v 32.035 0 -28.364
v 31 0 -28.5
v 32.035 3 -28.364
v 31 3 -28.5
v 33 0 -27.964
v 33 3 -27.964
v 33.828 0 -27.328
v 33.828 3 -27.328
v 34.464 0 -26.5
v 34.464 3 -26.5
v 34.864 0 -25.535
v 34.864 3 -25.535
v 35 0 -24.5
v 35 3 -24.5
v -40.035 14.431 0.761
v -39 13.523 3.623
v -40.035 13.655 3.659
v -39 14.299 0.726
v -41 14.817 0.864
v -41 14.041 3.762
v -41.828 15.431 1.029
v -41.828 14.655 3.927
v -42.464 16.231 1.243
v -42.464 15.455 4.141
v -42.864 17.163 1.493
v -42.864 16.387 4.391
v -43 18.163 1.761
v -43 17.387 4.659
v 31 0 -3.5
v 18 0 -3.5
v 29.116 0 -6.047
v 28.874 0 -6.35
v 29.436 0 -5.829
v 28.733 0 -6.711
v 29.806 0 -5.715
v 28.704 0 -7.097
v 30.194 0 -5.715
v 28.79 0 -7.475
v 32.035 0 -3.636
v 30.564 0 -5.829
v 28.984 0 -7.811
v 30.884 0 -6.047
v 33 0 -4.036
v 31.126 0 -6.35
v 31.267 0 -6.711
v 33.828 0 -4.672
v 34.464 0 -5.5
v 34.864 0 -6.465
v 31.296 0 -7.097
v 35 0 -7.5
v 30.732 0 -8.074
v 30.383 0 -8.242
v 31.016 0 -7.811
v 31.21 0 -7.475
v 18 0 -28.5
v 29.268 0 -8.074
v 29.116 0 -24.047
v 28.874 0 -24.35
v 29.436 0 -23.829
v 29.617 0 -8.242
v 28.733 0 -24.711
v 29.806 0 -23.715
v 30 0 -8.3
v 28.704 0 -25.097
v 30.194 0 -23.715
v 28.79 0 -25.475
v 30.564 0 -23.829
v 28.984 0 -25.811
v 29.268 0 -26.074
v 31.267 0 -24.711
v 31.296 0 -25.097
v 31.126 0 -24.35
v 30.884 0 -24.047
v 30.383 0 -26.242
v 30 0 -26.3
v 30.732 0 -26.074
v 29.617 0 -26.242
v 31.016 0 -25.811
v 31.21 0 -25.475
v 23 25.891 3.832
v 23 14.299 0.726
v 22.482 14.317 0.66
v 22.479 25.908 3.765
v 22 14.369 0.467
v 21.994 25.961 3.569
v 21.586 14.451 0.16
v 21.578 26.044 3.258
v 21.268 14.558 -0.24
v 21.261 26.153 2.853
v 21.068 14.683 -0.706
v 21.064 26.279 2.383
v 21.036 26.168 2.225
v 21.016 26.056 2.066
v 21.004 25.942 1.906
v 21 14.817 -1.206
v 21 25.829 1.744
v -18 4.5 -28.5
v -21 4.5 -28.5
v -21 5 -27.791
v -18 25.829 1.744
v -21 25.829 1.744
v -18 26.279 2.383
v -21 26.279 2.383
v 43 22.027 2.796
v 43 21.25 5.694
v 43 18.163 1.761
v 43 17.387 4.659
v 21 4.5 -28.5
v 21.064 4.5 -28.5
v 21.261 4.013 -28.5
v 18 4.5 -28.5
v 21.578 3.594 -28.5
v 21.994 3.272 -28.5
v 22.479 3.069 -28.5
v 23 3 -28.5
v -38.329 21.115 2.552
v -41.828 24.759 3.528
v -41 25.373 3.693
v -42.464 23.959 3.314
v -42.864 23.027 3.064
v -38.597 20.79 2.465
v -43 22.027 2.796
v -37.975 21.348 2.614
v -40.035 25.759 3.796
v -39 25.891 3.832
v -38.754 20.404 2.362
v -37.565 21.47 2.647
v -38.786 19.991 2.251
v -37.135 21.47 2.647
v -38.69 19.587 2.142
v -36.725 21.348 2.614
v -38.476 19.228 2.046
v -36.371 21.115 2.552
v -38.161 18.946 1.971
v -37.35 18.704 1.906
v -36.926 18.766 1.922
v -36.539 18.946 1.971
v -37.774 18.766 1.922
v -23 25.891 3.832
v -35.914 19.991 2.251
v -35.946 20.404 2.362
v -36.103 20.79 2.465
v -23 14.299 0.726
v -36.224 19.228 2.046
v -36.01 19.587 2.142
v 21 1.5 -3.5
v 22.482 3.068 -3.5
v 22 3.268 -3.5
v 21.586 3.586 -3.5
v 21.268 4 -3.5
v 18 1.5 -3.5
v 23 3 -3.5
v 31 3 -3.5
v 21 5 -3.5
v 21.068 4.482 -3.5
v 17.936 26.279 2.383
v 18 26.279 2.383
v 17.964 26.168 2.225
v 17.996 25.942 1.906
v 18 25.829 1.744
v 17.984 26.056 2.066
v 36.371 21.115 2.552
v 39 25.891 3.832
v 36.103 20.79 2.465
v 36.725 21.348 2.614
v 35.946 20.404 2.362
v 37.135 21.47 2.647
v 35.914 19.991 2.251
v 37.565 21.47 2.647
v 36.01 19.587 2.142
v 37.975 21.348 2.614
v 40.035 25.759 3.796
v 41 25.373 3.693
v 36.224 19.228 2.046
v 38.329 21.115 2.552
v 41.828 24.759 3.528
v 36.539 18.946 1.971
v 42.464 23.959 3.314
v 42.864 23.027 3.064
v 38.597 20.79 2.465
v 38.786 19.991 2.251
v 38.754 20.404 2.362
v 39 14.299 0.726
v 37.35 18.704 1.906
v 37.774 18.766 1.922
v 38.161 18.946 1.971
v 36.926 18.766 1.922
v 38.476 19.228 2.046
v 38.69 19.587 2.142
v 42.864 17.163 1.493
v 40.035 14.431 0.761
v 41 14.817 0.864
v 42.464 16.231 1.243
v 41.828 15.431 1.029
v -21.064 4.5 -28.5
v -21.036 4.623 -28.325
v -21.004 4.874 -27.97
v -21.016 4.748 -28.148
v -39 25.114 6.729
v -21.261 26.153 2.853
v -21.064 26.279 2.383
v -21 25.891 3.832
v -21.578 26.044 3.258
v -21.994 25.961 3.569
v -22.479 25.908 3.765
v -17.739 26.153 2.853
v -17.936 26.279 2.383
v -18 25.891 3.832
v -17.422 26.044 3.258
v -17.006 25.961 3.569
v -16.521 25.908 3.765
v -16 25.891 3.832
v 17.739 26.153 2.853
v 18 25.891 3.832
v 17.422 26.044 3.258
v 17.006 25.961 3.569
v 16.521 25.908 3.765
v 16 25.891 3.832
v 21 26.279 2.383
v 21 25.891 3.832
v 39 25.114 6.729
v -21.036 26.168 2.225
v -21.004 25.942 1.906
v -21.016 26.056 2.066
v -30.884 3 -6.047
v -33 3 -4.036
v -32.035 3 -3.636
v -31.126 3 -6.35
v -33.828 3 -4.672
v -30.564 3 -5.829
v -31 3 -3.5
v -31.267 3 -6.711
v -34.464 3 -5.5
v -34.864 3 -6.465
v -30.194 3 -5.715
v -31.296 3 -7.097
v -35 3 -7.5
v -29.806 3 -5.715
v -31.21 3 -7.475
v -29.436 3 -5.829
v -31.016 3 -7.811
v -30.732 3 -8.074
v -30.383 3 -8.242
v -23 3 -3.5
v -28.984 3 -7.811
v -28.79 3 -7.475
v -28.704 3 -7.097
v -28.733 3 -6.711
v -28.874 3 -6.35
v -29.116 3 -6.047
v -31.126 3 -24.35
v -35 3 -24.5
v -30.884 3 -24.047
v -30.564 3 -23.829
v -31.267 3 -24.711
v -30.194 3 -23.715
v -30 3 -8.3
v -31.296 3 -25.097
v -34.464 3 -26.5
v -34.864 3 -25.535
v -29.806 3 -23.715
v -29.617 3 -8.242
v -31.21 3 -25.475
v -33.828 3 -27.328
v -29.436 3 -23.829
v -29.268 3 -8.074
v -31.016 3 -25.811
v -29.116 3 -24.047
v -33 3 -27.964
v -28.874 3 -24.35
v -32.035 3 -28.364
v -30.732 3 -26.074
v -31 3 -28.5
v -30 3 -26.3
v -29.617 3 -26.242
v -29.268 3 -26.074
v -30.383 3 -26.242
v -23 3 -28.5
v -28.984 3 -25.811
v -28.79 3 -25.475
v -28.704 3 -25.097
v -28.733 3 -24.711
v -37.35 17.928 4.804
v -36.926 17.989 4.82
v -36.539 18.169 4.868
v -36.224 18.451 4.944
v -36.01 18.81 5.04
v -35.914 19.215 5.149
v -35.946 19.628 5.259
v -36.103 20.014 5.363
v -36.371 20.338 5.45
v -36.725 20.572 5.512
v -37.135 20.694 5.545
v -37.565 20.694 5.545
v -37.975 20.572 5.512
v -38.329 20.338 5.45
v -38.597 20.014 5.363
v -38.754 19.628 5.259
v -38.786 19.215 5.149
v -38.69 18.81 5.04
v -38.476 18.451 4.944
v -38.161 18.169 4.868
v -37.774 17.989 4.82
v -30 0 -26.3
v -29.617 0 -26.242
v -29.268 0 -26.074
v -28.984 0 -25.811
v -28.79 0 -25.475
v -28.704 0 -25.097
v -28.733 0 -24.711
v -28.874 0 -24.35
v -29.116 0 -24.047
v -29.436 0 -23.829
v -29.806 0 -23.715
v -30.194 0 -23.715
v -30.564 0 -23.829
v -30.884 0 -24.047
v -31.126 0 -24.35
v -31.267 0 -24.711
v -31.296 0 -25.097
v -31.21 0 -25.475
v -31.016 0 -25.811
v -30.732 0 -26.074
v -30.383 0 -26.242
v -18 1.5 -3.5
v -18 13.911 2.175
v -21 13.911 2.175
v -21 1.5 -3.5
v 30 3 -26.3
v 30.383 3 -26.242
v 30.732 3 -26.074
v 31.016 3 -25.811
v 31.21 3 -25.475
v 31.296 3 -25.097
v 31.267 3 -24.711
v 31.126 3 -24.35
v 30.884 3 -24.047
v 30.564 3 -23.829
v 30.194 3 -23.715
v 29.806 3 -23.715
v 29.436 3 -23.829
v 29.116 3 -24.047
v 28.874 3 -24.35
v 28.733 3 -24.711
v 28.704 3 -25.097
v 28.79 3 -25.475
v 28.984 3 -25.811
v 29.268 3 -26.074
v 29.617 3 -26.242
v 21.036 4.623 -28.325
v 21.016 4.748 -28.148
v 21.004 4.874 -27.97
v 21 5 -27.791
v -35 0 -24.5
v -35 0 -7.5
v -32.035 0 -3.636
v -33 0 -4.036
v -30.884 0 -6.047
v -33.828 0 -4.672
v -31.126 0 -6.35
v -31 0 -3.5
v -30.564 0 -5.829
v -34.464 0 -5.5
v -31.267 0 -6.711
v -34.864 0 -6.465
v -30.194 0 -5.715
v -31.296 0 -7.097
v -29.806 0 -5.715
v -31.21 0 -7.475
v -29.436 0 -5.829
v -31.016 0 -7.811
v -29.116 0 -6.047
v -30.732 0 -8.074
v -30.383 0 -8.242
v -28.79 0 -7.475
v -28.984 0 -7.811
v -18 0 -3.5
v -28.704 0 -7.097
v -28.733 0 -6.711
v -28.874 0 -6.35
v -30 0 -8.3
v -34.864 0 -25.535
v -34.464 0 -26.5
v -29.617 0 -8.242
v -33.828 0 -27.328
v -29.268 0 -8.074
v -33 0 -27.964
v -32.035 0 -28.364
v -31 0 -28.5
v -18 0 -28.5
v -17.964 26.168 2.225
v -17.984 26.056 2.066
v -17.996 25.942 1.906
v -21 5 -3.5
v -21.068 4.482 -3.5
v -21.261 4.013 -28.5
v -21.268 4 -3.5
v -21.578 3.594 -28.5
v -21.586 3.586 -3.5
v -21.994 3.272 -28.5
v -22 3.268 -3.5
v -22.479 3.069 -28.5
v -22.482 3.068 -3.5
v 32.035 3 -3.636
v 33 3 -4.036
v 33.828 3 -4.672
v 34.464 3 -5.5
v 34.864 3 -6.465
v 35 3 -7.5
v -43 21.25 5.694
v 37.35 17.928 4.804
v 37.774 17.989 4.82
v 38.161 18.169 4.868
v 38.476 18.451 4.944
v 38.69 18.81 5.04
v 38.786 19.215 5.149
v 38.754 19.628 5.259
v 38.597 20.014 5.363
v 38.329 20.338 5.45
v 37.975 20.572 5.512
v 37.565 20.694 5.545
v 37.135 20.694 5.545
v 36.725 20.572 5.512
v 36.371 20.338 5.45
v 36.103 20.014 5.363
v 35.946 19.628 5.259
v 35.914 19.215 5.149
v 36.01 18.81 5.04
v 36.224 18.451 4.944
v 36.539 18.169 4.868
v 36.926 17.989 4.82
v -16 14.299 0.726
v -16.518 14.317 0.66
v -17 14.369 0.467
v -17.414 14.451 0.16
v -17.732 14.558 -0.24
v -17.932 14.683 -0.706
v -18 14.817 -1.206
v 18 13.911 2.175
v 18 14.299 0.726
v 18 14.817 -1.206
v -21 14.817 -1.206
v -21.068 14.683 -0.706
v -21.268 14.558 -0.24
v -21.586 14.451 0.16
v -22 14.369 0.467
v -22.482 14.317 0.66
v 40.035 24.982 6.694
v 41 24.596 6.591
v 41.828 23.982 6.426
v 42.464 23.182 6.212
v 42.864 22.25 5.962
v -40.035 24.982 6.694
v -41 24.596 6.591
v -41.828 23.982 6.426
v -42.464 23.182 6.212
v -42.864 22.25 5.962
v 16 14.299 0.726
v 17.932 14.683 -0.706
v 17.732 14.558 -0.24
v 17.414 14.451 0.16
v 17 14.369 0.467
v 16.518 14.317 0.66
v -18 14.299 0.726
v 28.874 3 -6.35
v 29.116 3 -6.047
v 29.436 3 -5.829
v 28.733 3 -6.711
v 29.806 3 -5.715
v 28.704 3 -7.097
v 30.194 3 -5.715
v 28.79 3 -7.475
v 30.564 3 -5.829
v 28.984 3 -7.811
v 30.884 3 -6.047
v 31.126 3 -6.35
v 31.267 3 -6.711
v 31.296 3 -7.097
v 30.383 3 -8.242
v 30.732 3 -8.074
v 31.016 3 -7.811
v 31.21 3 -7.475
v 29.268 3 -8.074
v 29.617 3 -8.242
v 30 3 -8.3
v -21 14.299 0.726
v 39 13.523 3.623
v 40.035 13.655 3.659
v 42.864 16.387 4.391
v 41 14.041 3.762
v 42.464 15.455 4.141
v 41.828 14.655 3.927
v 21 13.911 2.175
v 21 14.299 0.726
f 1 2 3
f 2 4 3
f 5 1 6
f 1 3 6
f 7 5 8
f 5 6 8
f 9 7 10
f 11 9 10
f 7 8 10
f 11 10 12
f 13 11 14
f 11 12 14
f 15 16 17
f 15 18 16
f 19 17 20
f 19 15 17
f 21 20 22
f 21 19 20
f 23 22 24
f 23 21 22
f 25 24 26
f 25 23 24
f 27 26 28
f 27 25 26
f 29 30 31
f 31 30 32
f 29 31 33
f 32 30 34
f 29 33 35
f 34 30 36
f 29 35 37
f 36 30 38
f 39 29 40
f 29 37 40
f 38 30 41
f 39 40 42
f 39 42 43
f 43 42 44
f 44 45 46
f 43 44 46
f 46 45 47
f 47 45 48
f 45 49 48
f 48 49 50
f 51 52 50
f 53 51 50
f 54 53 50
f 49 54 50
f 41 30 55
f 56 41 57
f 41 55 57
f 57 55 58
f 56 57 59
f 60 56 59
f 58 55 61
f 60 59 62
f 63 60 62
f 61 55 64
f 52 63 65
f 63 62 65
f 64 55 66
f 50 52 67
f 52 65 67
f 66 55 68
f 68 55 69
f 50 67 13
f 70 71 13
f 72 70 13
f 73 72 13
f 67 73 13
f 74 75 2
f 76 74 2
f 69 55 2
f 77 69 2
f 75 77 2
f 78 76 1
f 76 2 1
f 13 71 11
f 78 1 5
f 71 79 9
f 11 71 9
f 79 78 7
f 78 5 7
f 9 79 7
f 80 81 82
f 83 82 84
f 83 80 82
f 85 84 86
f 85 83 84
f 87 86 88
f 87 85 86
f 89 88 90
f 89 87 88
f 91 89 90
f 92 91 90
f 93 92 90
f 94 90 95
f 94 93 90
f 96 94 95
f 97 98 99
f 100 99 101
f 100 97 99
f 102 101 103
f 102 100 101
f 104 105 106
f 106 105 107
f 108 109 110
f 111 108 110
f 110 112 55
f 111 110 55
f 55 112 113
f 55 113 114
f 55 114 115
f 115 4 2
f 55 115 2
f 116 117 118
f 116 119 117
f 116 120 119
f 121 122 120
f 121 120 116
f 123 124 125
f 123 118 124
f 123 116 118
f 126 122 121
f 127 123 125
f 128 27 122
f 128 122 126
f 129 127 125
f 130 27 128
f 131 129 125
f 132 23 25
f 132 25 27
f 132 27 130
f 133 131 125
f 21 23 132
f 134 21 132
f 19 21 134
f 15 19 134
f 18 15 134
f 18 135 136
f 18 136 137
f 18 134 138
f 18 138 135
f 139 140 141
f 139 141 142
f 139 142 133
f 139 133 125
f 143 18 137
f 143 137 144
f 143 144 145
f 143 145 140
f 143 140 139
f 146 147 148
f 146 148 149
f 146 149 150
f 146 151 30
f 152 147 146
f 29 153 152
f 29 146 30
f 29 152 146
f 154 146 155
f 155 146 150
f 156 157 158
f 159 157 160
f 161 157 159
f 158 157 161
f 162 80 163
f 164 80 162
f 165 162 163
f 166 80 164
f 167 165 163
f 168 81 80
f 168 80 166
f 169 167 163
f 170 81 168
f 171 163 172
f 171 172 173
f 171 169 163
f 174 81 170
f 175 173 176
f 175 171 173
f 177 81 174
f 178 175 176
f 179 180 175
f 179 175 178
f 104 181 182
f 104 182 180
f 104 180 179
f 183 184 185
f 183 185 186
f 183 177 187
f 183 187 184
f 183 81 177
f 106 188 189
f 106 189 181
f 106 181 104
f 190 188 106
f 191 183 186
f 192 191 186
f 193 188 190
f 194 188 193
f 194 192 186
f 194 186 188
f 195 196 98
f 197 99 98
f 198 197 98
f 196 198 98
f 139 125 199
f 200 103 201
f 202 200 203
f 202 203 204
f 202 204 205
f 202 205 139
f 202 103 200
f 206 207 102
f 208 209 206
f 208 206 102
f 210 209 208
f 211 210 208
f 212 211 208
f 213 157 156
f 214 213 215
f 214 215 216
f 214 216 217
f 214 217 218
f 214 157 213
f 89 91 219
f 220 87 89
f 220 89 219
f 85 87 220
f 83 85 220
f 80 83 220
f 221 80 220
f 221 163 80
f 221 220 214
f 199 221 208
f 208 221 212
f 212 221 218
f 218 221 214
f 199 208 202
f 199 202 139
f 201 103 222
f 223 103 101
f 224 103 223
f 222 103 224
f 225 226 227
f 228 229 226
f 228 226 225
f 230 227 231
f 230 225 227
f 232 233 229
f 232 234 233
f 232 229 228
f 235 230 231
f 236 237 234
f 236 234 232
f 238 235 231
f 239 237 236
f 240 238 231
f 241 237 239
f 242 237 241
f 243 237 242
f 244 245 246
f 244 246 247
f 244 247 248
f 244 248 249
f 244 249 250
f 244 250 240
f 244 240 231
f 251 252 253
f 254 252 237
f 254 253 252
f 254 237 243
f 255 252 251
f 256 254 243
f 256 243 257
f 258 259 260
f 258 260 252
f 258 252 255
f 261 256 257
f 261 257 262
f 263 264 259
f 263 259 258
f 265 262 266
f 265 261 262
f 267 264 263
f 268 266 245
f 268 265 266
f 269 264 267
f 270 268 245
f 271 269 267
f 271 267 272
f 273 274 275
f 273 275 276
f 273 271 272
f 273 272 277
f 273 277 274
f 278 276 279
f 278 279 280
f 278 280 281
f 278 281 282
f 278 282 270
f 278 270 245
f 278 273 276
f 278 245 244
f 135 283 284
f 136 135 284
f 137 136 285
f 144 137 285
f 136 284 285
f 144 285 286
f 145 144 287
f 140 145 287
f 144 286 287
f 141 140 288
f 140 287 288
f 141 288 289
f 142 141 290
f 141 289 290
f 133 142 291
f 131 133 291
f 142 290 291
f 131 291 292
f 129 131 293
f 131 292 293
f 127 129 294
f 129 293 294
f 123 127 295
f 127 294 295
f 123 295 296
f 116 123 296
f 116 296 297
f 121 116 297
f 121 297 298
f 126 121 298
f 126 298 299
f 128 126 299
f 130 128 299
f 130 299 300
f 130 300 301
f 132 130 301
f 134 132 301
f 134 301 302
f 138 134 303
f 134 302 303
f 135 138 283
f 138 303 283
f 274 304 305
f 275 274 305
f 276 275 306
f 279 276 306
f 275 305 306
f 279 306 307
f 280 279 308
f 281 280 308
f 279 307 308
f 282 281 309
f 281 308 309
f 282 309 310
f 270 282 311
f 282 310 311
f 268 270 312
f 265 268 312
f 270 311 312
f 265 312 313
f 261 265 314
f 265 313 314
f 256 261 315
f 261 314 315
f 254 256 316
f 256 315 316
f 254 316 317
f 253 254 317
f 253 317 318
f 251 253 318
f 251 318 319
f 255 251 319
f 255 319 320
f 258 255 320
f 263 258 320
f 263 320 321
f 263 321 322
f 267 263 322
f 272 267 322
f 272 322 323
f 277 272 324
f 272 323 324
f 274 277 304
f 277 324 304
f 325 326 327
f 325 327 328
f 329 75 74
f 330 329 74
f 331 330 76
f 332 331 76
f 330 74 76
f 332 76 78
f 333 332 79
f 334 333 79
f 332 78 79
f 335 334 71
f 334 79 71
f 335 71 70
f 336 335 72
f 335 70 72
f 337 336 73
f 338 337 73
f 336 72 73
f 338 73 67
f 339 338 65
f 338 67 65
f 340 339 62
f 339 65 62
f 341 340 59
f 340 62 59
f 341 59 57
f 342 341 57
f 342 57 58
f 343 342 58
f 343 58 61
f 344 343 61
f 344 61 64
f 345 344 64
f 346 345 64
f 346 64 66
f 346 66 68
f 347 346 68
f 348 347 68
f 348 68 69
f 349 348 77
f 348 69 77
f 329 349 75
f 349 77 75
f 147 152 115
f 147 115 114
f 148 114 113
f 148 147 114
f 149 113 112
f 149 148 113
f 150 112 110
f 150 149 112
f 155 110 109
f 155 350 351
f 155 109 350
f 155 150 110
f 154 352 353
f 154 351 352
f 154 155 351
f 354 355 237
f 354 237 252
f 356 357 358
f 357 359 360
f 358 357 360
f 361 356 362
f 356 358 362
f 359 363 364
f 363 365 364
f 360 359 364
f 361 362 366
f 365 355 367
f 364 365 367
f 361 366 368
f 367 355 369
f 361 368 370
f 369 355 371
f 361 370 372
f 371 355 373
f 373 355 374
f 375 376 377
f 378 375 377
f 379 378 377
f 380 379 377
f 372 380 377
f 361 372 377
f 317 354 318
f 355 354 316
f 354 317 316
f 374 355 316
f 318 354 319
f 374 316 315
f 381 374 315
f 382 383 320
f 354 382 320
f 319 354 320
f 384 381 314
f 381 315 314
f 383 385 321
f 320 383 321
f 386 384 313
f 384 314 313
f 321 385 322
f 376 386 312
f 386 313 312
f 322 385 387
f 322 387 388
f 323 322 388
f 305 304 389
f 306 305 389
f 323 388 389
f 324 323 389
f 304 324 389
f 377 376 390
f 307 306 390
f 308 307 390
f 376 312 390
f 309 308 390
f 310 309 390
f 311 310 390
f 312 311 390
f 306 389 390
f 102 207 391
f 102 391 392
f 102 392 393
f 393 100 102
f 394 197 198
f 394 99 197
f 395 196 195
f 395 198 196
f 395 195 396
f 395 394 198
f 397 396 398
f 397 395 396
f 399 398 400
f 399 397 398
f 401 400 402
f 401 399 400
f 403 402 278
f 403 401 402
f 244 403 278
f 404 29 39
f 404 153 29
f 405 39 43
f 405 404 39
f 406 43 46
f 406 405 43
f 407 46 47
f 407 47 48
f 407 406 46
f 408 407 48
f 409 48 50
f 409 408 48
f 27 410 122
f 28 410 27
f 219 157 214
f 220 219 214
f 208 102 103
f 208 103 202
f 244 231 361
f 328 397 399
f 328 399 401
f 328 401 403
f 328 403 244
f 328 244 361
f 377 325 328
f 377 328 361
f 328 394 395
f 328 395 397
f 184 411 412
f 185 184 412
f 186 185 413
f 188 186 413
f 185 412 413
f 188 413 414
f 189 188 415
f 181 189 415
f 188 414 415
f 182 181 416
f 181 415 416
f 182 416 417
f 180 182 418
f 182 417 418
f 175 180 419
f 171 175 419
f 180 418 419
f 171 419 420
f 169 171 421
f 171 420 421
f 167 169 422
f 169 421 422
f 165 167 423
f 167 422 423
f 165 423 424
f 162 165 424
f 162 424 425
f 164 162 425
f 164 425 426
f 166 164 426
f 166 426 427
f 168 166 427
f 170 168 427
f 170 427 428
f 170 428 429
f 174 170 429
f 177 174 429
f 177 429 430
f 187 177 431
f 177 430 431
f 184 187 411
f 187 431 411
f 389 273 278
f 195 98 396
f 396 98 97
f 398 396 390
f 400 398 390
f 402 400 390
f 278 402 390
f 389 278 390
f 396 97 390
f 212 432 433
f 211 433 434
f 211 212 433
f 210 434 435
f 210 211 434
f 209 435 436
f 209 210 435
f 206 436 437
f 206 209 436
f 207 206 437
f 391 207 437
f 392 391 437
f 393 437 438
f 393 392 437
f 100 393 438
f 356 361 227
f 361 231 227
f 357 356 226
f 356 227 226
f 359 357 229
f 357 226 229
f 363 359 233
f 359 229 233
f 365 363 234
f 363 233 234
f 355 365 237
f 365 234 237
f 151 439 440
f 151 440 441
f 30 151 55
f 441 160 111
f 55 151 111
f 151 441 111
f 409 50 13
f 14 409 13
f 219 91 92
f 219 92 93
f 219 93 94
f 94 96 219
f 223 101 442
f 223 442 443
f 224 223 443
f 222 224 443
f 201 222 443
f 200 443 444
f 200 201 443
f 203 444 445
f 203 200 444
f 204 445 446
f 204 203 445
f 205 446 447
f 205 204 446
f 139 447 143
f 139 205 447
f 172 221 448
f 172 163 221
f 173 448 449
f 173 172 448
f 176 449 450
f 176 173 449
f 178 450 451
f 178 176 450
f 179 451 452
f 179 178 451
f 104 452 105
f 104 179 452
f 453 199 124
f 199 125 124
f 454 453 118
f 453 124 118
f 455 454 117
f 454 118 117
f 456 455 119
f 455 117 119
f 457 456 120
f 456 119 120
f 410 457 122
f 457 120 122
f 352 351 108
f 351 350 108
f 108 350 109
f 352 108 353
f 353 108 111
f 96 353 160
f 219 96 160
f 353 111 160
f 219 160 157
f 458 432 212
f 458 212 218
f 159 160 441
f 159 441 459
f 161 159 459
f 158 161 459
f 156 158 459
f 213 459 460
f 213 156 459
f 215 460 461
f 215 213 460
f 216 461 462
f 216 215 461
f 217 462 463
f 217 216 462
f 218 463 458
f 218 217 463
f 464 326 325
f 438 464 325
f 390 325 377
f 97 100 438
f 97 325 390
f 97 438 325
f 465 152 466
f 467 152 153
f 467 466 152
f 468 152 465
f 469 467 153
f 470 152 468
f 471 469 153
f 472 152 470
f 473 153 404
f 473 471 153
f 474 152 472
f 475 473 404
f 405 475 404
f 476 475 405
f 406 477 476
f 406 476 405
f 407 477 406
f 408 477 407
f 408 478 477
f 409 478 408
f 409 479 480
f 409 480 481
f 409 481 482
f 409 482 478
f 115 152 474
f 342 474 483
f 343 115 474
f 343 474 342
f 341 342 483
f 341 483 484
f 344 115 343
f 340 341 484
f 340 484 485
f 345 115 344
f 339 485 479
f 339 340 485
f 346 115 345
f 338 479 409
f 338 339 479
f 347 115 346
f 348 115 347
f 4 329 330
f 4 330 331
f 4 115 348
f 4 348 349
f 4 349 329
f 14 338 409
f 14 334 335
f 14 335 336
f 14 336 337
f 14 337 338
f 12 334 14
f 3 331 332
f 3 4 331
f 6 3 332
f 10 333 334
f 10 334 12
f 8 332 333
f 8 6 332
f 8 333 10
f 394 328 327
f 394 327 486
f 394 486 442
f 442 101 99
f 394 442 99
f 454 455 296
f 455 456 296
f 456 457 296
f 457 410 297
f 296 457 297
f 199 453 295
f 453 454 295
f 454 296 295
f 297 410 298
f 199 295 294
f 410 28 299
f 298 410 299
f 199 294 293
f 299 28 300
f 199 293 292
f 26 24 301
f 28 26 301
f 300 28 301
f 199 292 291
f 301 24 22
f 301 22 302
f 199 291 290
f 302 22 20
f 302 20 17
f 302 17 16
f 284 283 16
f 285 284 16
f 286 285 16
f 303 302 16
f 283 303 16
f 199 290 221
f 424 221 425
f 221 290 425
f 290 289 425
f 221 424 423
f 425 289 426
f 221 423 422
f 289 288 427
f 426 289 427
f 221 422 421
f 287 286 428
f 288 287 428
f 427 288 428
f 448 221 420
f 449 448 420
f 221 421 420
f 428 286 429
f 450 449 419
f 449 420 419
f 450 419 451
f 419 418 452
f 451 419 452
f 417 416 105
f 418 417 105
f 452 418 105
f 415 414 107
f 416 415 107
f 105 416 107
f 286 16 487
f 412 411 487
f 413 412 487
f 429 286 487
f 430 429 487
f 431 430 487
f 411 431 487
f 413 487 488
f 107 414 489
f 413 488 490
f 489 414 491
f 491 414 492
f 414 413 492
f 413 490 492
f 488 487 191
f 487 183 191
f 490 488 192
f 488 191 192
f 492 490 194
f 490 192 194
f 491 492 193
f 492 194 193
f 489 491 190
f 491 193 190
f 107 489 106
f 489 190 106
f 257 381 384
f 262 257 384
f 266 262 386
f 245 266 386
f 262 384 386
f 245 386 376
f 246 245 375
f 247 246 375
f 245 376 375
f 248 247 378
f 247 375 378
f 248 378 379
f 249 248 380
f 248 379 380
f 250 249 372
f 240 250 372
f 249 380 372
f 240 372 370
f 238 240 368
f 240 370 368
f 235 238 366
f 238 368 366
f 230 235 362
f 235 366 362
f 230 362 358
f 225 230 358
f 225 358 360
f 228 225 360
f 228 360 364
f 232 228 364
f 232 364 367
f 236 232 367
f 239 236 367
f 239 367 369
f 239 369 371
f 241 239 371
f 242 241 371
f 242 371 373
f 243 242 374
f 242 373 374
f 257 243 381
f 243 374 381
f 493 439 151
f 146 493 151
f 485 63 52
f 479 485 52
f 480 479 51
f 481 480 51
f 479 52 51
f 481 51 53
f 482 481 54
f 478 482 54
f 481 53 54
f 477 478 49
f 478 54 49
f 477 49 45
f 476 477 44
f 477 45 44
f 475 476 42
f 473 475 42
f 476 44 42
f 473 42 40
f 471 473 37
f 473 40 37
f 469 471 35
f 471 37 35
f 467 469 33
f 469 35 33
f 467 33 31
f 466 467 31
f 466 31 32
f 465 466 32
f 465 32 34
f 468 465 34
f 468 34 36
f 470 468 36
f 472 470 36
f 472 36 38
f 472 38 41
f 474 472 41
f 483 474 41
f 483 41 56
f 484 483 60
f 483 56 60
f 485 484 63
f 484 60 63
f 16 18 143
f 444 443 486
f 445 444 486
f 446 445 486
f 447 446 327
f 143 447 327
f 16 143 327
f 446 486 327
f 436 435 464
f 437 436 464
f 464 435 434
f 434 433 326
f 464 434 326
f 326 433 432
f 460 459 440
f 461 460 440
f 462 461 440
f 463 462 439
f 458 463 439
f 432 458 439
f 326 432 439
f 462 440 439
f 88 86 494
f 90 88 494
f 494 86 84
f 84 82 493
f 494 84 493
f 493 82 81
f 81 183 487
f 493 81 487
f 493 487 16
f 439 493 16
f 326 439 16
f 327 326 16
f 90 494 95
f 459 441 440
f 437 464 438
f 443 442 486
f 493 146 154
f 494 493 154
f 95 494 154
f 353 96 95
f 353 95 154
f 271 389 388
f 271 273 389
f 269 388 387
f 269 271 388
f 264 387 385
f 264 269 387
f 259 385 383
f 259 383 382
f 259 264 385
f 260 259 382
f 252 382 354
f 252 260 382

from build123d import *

# Parameters (mm, degrees)
SKETCH1_W             = 17
SKETCH1_H             = 25
BOSS_EXTRUDE1_DEPTH   = 3
BOSS_EXTRUDE1_2_DEPTH = 3
SKETCH2_W             = 86
SKETCH2_H             = 12
BOSS_EXTRUDE2_DEPTH   = 3
SKETCH3_R             = 1.3
CUT_EXTRUDE1_DEPTH    = 3
SKETCH4_R             = 1.44
CUT_EXTRUDE2_DEPTH    = 3
BOSS_EXTRUDE3_START   = 18
BOSS_EXTRUDE3_DEPTH   = 3
BOSS_EXTRUDE4_START   = -18
BOSS_EXTRUDE4_DEPTH   = 3
FILLET1_R             = 2
FILLET2_R             = 4


with BuildPart() as part:
    # Sketch1 → Boss-Extrude1 (new body)
    with BuildSketch(Plane(origin=(0, 0, 0), x_dir=(1, 0, 0), z_dir=(0, 1, 0))):
        with Locations((-26.5, 16)):
            Rectangle(SKETCH1_W, SKETCH1_H)
    extrude(amount=BOSS_EXTRUDE1_DEPTH)


with BuildPart() as body_2:
    # Sketch1 → Boss-Extrude1 2 (new body)
    with BuildSketch(Plane(origin=(0, 0, 0), x_dir=(1, 0, 0), z_dir=(0, 1, 0))):
        with Locations((26.5, 16)):
            Rectangle(SKETCH1_W, SKETCH1_H)
    extrude(amount=BOSS_EXTRUDE1_2_DEPTH)


with BuildPart() as body_3:
    # Sketch2 → Boss-Extrude2 (new body)
    with BuildSketch(Plane(origin=(0, 0, 0), x_dir=(1, 0, 0), z_dir=(0, 0.2588190451025247, -0.9659258262890672))):
        with Locations((0, -20)):
            Rectangle(SKETCH2_W, SKETCH2_H)
    extrude(amount=BOSS_EXTRUDE2_DEPTH)

    # Sketch4 → Cut-Extrude2 (cut)
    with BuildSketch(Plane(origin=(0, 0, 0), x_dir=(1, 0, 0), z_dir=(0, -0.25881904510252474, 0.9659258262890673))):
        with Locations(Location((-37.35, 20, 0), (0, 0, 270))):
            Circle(SKETCH4_R)
        with Locations(Location((37.35, 20, 0), (0, 0, 270))):
            Circle(SKETCH4_R)
    extrude(amount=-CUT_EXTRUDE2_DEPTH, mode=Mode.SUBTRACT)


with BuildPart() as cut_extrude1_tool:
    # Sketch3 → Cut-Extrude1 (new body)
    with BuildSketch(Plane.XZ):
        with Locations(Location((30, -25, 0), (0, 0, 270))):
            Circle(SKETCH3_R)
        with Locations(Location((30, -7, 0), (0, 0, 270))):
            Circle(SKETCH3_R)
        with Locations(Location((-30, -25, 0), (0, 0, 270))):
            Circle(SKETCH3_R)
        with Locations(Location((-30, -7, 0), (0, 0, 270))):
            Circle(SKETCH3_R)
    extrude(amount=-CUT_EXTRUDE1_DEPTH)


with BuildPart() as part_1:
    add(part.part)

    # Cut-Extrude1: cut by cut_extrude1_tool
    add(cut_extrude1_tool.part, mode=Mode.SUBTRACT)



with BuildPart() as body_2_1:
    add(body_2.part)

    # Cut-Extrude1: cut by cut_extrude1_tool
    add(cut_extrude1_tool.part, mode=Mode.SUBTRACT)


    add(body_3.part)  # Boss-Extrude3 merges body 3
    # Sketch5 → Boss-Extrude3 (add)
    with BuildSketch(Plane(origin=(0, 0, 0), x_dir=(0, 0, -1), z_dir=(1, 0, 0)).offset(BOSS_EXTRUDE3_START)):
        Polygon((3.5, 3), (28.5, 3), (28.5, 4.5), (-2.382628954, 26.278757186), (-3.831517694, 25.890528619), (-0.725689153, 14.299418703), (-2.174577892, 13.911190136), (3.5, 1.5), align=None)
    extrude(amount=BOSS_EXTRUDE3_DEPTH)


with BuildPart() as part_2:
    add(part_1.part)

    add(body_2_1.part)  # Boss-Extrude4 merges body 2
    # Sketch5<2> → Boss-Extrude4 (add)
    with BuildSketch(Plane(origin=(0, 0, 0), x_dir=(0, 0, -1), z_dir=(1, 0, 0)).offset(BOSS_EXTRUDE4_START)):
        Polygon((3.5, 3), (28.5, 3), (28.5, 4.5), (-2.382628954, 26.278757186), (-3.831517694, 25.890528619), (-0.725689153, 14.299418703), (-2.174577892, 13.911190136), (3.5, 1.5), align=None)
    extrude(amount=-BOSS_EXTRUDE4_DEPTH)

    # Fillet1
    # the kernel refuses this fillet: 2 mm, written as the material it adds along each edge
    with BuildSketch(Plane(origin=(-21, 3, -3.5), x_dir=(0, 1, 0), z_dir=(0, 0, -1))) as fillet1_piece_1_section:
        with BuildLine():
            CenterArc((FILLET1_R, -FILLET1_R), FILLET1_R, 90, 90)
            Line((0, -FILLET1_R), (0, 0))
            Line((0, 0), (FILLET1_R, 0))
        make_face()
    fillet1_piece_1 = extrude(amount=25, mode=Mode.PRIVATE)
    fillet1_piece_1 = split(fillet1_piece_1, bisect_by=Plane(origin=(-21.452953813, 10.041317551, -20.642322338), z_dir=(0, -0.8172264215847361, 0.5763167322434836)), keep=Keep.TOP, mode=Mode.PRIVATE)
    add(fillet1_piece_1)
    with BuildSketch(Plane(origin=(21, 3, -3.5), x_dir=(0, 1, 0), z_dir=(0, 0, -1))) as fillet1_piece_2_section:
        with BuildLine():
            CenterArc((FILLET1_R, FILLET1_R), FILLET1_R, 180, 90)
            Line((0, FILLET1_R), (0, 0))
            Line((0, 0), (FILLET1_R, 0))
        make_face()
    fillet1_piece_2 = extrude(amount=25, mode=Mode.PRIVATE)
    fillet1_piece_2 = split(fillet1_piece_2, bisect_by=Plane(origin=(21.452953813, 10.041317551, -20.642322338), z_dir=(0, -0.8172264215847361, 0.5763167322434836)), keep=Keep.TOP, mode=Mode.PRIVATE)
    add(fillet1_piece_2)
    with BuildSketch(Plane(origin=(-18, 25.890528619, 3.831517694), x_dir=(1, 0, 0), z_dir=(0, -0.9659258262890673, -0.2588190451025247))) as fillet1_piece_3_section:
        with BuildLine():
            CenterArc((FILLET1_R, -FILLET1_R), FILLET1_R, 90, 90)
            Line((0, -FILLET1_R), (0, 0))
            Line((0, 0), (FILLET1_R, 0))
        make_face()
    fillet1_piece_3 = extrude(amount=12, mode=Mode.PRIVATE)
    fillet1_piece_3 = split(fillet1_piece_3, bisect_by=Plane(origin=(-17.546921316, 24.007524822, -0.83801517), z_dir=(0, -0.8172264215847361, 0.5763167322434836)), keep=Keep.TOP, mode=Mode.PRIVATE)
    add(fillet1_piece_3)
    with BuildSketch(Plane(origin=(-21, 25.890528619, 3.831517694), x_dir=(0, 0.2588190451025247, -0.9659258262890672), z_dir=(0, -0.9659258262890673, -0.2588190451025247))) as fillet1_piece_4_section:
        with BuildLine():
            CenterArc((FILLET1_R, -FILLET1_R), FILLET1_R, 90, 90)
            Line((0, -FILLET1_R), (0, 0))
            Line((0, 0), (FILLET1_R, 0))
        make_face()
    fillet1_piece_4 = extrude(amount=12, mode=Mode.PRIVATE)
    fillet1_piece_4 = split(fillet1_piece_4, bisect_by=Plane(origin=(-21.453078684, 24.007524822, -0.838015171), z_dir=(0, -0.8172264215847361, 0.5763167322434836)), keep=Keep.TOP, mode=Mode.PRIVATE)
    add(fillet1_piece_4)
    with BuildSketch(Plane(origin=(21, 25.890528619, 3.831517694), x_dir=(1, 0, 0), z_dir=(0, -0.9659258262890673, -0.2588190451025247))) as fillet1_piece_5_section:
        with BuildLine():
            CenterArc((FILLET1_R, -FILLET1_R), FILLET1_R, 90, 90)
            Line((0, -FILLET1_R), (0, 0))
            Line((0, 0), (FILLET1_R, 0))
        make_face()
    fillet1_piece_5 = extrude(amount=12, mode=Mode.PRIVATE)
    fillet1_piece_5 = split(fillet1_piece_5, bisect_by=Plane(origin=(21.453078684, 24.007524822, -0.83801517), z_dir=(0, -0.8172264215847361, 0.5763167322434836)), keep=Keep.TOP, mode=Mode.PRIVATE)
    add(fillet1_piece_5)
    with BuildSketch(Plane(origin=(18, 25.890528619, 3.831517694), x_dir=(-1.776356839400251e-15, 0.25881904510252474, -0.9659258262890673), z_dir=(0, -0.9659258262890673, -0.2588190451025247))) as fillet1_piece_6_section:
        with BuildLine():
            CenterArc((FILLET1_R, -FILLET1_R), FILLET1_R, 90, 90)
            Line((0, -FILLET1_R), (0, 0))
            Line((0, 0), (FILLET1_R, 0))
        make_face()
    fillet1_piece_6 = extrude(amount=12, mode=Mode.PRIVATE)
    fillet1_piece_6 = split(fillet1_piece_6, bisect_by=Plane(origin=(17.546921316, 24.007524822, -0.838015171), z_dir=(0, -0.8172264215847361, 0.5763167322434836)), keep=Keep.TOP, mode=Mode.PRIVATE)
    add(fillet1_piece_6)

    # Fillet2
    fillet2_edges = [part_2.edges().sort_by_distance(p)[0] for p in [
        (43, 13.911190136, 2.174577892),
        (-43, 13.911190136, 2.174577892),
        (-43, 25.502300051, 5.280406433),
        (43, 25.502300051, 5.280406433),
        (35, 1.5, -28.5),
        (35, 1.5, -3.5),
        (-35, 1.5, -28.5),
        (-35, 1.5, -3.5),
    ]]
    fillet(fillet2_edges, radius=FILLET2_R)


solid = part_2.part
